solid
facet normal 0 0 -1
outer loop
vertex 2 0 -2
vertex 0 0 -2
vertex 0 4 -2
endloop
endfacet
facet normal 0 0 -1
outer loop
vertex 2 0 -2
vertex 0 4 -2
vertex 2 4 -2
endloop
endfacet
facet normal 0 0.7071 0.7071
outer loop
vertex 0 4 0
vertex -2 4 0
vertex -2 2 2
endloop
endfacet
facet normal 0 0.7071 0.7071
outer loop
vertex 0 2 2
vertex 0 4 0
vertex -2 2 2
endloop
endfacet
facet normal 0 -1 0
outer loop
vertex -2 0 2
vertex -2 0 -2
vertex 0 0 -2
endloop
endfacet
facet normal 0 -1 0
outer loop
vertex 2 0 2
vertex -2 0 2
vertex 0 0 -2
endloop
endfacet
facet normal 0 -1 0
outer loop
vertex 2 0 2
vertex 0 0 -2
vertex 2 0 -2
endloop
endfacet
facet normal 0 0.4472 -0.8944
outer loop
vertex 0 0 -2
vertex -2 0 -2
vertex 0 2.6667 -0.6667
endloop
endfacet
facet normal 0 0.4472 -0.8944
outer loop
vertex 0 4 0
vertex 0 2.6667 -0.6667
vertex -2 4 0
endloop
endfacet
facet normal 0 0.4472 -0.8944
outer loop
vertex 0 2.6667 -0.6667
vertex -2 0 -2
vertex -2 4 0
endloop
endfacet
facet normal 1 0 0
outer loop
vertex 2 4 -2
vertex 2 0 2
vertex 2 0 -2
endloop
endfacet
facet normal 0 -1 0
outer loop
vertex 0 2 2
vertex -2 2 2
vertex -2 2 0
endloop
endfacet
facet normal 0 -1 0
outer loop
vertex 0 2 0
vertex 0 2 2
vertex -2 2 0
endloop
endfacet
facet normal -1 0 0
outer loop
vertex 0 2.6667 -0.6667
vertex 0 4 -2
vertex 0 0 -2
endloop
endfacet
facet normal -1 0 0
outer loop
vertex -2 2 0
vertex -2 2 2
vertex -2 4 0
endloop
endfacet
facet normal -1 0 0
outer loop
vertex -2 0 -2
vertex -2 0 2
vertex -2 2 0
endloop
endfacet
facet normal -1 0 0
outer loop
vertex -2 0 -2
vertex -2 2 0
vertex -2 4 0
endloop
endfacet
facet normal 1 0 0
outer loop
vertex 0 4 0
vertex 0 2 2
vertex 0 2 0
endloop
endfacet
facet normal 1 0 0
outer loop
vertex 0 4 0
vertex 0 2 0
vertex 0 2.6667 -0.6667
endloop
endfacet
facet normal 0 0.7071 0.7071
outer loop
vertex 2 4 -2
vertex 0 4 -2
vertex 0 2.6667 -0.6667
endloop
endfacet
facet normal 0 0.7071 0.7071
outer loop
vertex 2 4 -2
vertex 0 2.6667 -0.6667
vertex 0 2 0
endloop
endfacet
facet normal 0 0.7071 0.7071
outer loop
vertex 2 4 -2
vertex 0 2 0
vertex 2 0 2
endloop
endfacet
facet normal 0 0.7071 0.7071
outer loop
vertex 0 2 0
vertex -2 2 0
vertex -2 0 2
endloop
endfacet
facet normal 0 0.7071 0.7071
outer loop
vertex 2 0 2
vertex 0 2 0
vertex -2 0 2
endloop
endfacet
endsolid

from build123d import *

# Parameters (mm, degrees)
SKETCH1_W           = 4
SKETCH1_H           = 4
BOSS_EXTRUDE1_DEPTH = 4
CUT_EXTRUDE1_DEPTH  = 2
CUT_EXTRUDE2_DEPTH  = 2


with BuildPart() as part:
    # Sketch1 → Boss-Extrude1 (new body)
    with BuildSketch(Plane(origin=(0, 0, 0), x_dir=(1, 0, 0), z_dir=(0, 1, 0))):
        Rectangle(SKETCH1_W, SKETCH1_H)
    extrude(amount=BOSS_EXTRUDE1_DEPTH)

    # Sketch2 → Cut-Extrude1 (cut)
    with BuildSketch(Plane.ZY.offset(2)):
        Polygon((0, 2), (2, 0), (2, 2), align=None)
        Polygon((0, 4), (2, 2), (2, 4), align=None)
        Polygon((-2, 0), (0, 4), (-2, 4), (-2, 2), align=None)
    extrude(amount=-CUT_EXTRUDE1_DEPTH, mode=Mode.SUBTRACT)

    # Sketch3 → Cut-Extrude2 (cut)
    with BuildSketch(Plane(origin=(2, 0, 0), x_dir=(0, 0, -1), z_dir=(1, 0, 0))):
        Polygon((-2, 0), (2, 4), (-2, 4.116557223), align=None)
    extrude(amount=-CUT_EXTRUDE2_DEPTH, mode=Mode.SUBTRACT)


solid = part.part
